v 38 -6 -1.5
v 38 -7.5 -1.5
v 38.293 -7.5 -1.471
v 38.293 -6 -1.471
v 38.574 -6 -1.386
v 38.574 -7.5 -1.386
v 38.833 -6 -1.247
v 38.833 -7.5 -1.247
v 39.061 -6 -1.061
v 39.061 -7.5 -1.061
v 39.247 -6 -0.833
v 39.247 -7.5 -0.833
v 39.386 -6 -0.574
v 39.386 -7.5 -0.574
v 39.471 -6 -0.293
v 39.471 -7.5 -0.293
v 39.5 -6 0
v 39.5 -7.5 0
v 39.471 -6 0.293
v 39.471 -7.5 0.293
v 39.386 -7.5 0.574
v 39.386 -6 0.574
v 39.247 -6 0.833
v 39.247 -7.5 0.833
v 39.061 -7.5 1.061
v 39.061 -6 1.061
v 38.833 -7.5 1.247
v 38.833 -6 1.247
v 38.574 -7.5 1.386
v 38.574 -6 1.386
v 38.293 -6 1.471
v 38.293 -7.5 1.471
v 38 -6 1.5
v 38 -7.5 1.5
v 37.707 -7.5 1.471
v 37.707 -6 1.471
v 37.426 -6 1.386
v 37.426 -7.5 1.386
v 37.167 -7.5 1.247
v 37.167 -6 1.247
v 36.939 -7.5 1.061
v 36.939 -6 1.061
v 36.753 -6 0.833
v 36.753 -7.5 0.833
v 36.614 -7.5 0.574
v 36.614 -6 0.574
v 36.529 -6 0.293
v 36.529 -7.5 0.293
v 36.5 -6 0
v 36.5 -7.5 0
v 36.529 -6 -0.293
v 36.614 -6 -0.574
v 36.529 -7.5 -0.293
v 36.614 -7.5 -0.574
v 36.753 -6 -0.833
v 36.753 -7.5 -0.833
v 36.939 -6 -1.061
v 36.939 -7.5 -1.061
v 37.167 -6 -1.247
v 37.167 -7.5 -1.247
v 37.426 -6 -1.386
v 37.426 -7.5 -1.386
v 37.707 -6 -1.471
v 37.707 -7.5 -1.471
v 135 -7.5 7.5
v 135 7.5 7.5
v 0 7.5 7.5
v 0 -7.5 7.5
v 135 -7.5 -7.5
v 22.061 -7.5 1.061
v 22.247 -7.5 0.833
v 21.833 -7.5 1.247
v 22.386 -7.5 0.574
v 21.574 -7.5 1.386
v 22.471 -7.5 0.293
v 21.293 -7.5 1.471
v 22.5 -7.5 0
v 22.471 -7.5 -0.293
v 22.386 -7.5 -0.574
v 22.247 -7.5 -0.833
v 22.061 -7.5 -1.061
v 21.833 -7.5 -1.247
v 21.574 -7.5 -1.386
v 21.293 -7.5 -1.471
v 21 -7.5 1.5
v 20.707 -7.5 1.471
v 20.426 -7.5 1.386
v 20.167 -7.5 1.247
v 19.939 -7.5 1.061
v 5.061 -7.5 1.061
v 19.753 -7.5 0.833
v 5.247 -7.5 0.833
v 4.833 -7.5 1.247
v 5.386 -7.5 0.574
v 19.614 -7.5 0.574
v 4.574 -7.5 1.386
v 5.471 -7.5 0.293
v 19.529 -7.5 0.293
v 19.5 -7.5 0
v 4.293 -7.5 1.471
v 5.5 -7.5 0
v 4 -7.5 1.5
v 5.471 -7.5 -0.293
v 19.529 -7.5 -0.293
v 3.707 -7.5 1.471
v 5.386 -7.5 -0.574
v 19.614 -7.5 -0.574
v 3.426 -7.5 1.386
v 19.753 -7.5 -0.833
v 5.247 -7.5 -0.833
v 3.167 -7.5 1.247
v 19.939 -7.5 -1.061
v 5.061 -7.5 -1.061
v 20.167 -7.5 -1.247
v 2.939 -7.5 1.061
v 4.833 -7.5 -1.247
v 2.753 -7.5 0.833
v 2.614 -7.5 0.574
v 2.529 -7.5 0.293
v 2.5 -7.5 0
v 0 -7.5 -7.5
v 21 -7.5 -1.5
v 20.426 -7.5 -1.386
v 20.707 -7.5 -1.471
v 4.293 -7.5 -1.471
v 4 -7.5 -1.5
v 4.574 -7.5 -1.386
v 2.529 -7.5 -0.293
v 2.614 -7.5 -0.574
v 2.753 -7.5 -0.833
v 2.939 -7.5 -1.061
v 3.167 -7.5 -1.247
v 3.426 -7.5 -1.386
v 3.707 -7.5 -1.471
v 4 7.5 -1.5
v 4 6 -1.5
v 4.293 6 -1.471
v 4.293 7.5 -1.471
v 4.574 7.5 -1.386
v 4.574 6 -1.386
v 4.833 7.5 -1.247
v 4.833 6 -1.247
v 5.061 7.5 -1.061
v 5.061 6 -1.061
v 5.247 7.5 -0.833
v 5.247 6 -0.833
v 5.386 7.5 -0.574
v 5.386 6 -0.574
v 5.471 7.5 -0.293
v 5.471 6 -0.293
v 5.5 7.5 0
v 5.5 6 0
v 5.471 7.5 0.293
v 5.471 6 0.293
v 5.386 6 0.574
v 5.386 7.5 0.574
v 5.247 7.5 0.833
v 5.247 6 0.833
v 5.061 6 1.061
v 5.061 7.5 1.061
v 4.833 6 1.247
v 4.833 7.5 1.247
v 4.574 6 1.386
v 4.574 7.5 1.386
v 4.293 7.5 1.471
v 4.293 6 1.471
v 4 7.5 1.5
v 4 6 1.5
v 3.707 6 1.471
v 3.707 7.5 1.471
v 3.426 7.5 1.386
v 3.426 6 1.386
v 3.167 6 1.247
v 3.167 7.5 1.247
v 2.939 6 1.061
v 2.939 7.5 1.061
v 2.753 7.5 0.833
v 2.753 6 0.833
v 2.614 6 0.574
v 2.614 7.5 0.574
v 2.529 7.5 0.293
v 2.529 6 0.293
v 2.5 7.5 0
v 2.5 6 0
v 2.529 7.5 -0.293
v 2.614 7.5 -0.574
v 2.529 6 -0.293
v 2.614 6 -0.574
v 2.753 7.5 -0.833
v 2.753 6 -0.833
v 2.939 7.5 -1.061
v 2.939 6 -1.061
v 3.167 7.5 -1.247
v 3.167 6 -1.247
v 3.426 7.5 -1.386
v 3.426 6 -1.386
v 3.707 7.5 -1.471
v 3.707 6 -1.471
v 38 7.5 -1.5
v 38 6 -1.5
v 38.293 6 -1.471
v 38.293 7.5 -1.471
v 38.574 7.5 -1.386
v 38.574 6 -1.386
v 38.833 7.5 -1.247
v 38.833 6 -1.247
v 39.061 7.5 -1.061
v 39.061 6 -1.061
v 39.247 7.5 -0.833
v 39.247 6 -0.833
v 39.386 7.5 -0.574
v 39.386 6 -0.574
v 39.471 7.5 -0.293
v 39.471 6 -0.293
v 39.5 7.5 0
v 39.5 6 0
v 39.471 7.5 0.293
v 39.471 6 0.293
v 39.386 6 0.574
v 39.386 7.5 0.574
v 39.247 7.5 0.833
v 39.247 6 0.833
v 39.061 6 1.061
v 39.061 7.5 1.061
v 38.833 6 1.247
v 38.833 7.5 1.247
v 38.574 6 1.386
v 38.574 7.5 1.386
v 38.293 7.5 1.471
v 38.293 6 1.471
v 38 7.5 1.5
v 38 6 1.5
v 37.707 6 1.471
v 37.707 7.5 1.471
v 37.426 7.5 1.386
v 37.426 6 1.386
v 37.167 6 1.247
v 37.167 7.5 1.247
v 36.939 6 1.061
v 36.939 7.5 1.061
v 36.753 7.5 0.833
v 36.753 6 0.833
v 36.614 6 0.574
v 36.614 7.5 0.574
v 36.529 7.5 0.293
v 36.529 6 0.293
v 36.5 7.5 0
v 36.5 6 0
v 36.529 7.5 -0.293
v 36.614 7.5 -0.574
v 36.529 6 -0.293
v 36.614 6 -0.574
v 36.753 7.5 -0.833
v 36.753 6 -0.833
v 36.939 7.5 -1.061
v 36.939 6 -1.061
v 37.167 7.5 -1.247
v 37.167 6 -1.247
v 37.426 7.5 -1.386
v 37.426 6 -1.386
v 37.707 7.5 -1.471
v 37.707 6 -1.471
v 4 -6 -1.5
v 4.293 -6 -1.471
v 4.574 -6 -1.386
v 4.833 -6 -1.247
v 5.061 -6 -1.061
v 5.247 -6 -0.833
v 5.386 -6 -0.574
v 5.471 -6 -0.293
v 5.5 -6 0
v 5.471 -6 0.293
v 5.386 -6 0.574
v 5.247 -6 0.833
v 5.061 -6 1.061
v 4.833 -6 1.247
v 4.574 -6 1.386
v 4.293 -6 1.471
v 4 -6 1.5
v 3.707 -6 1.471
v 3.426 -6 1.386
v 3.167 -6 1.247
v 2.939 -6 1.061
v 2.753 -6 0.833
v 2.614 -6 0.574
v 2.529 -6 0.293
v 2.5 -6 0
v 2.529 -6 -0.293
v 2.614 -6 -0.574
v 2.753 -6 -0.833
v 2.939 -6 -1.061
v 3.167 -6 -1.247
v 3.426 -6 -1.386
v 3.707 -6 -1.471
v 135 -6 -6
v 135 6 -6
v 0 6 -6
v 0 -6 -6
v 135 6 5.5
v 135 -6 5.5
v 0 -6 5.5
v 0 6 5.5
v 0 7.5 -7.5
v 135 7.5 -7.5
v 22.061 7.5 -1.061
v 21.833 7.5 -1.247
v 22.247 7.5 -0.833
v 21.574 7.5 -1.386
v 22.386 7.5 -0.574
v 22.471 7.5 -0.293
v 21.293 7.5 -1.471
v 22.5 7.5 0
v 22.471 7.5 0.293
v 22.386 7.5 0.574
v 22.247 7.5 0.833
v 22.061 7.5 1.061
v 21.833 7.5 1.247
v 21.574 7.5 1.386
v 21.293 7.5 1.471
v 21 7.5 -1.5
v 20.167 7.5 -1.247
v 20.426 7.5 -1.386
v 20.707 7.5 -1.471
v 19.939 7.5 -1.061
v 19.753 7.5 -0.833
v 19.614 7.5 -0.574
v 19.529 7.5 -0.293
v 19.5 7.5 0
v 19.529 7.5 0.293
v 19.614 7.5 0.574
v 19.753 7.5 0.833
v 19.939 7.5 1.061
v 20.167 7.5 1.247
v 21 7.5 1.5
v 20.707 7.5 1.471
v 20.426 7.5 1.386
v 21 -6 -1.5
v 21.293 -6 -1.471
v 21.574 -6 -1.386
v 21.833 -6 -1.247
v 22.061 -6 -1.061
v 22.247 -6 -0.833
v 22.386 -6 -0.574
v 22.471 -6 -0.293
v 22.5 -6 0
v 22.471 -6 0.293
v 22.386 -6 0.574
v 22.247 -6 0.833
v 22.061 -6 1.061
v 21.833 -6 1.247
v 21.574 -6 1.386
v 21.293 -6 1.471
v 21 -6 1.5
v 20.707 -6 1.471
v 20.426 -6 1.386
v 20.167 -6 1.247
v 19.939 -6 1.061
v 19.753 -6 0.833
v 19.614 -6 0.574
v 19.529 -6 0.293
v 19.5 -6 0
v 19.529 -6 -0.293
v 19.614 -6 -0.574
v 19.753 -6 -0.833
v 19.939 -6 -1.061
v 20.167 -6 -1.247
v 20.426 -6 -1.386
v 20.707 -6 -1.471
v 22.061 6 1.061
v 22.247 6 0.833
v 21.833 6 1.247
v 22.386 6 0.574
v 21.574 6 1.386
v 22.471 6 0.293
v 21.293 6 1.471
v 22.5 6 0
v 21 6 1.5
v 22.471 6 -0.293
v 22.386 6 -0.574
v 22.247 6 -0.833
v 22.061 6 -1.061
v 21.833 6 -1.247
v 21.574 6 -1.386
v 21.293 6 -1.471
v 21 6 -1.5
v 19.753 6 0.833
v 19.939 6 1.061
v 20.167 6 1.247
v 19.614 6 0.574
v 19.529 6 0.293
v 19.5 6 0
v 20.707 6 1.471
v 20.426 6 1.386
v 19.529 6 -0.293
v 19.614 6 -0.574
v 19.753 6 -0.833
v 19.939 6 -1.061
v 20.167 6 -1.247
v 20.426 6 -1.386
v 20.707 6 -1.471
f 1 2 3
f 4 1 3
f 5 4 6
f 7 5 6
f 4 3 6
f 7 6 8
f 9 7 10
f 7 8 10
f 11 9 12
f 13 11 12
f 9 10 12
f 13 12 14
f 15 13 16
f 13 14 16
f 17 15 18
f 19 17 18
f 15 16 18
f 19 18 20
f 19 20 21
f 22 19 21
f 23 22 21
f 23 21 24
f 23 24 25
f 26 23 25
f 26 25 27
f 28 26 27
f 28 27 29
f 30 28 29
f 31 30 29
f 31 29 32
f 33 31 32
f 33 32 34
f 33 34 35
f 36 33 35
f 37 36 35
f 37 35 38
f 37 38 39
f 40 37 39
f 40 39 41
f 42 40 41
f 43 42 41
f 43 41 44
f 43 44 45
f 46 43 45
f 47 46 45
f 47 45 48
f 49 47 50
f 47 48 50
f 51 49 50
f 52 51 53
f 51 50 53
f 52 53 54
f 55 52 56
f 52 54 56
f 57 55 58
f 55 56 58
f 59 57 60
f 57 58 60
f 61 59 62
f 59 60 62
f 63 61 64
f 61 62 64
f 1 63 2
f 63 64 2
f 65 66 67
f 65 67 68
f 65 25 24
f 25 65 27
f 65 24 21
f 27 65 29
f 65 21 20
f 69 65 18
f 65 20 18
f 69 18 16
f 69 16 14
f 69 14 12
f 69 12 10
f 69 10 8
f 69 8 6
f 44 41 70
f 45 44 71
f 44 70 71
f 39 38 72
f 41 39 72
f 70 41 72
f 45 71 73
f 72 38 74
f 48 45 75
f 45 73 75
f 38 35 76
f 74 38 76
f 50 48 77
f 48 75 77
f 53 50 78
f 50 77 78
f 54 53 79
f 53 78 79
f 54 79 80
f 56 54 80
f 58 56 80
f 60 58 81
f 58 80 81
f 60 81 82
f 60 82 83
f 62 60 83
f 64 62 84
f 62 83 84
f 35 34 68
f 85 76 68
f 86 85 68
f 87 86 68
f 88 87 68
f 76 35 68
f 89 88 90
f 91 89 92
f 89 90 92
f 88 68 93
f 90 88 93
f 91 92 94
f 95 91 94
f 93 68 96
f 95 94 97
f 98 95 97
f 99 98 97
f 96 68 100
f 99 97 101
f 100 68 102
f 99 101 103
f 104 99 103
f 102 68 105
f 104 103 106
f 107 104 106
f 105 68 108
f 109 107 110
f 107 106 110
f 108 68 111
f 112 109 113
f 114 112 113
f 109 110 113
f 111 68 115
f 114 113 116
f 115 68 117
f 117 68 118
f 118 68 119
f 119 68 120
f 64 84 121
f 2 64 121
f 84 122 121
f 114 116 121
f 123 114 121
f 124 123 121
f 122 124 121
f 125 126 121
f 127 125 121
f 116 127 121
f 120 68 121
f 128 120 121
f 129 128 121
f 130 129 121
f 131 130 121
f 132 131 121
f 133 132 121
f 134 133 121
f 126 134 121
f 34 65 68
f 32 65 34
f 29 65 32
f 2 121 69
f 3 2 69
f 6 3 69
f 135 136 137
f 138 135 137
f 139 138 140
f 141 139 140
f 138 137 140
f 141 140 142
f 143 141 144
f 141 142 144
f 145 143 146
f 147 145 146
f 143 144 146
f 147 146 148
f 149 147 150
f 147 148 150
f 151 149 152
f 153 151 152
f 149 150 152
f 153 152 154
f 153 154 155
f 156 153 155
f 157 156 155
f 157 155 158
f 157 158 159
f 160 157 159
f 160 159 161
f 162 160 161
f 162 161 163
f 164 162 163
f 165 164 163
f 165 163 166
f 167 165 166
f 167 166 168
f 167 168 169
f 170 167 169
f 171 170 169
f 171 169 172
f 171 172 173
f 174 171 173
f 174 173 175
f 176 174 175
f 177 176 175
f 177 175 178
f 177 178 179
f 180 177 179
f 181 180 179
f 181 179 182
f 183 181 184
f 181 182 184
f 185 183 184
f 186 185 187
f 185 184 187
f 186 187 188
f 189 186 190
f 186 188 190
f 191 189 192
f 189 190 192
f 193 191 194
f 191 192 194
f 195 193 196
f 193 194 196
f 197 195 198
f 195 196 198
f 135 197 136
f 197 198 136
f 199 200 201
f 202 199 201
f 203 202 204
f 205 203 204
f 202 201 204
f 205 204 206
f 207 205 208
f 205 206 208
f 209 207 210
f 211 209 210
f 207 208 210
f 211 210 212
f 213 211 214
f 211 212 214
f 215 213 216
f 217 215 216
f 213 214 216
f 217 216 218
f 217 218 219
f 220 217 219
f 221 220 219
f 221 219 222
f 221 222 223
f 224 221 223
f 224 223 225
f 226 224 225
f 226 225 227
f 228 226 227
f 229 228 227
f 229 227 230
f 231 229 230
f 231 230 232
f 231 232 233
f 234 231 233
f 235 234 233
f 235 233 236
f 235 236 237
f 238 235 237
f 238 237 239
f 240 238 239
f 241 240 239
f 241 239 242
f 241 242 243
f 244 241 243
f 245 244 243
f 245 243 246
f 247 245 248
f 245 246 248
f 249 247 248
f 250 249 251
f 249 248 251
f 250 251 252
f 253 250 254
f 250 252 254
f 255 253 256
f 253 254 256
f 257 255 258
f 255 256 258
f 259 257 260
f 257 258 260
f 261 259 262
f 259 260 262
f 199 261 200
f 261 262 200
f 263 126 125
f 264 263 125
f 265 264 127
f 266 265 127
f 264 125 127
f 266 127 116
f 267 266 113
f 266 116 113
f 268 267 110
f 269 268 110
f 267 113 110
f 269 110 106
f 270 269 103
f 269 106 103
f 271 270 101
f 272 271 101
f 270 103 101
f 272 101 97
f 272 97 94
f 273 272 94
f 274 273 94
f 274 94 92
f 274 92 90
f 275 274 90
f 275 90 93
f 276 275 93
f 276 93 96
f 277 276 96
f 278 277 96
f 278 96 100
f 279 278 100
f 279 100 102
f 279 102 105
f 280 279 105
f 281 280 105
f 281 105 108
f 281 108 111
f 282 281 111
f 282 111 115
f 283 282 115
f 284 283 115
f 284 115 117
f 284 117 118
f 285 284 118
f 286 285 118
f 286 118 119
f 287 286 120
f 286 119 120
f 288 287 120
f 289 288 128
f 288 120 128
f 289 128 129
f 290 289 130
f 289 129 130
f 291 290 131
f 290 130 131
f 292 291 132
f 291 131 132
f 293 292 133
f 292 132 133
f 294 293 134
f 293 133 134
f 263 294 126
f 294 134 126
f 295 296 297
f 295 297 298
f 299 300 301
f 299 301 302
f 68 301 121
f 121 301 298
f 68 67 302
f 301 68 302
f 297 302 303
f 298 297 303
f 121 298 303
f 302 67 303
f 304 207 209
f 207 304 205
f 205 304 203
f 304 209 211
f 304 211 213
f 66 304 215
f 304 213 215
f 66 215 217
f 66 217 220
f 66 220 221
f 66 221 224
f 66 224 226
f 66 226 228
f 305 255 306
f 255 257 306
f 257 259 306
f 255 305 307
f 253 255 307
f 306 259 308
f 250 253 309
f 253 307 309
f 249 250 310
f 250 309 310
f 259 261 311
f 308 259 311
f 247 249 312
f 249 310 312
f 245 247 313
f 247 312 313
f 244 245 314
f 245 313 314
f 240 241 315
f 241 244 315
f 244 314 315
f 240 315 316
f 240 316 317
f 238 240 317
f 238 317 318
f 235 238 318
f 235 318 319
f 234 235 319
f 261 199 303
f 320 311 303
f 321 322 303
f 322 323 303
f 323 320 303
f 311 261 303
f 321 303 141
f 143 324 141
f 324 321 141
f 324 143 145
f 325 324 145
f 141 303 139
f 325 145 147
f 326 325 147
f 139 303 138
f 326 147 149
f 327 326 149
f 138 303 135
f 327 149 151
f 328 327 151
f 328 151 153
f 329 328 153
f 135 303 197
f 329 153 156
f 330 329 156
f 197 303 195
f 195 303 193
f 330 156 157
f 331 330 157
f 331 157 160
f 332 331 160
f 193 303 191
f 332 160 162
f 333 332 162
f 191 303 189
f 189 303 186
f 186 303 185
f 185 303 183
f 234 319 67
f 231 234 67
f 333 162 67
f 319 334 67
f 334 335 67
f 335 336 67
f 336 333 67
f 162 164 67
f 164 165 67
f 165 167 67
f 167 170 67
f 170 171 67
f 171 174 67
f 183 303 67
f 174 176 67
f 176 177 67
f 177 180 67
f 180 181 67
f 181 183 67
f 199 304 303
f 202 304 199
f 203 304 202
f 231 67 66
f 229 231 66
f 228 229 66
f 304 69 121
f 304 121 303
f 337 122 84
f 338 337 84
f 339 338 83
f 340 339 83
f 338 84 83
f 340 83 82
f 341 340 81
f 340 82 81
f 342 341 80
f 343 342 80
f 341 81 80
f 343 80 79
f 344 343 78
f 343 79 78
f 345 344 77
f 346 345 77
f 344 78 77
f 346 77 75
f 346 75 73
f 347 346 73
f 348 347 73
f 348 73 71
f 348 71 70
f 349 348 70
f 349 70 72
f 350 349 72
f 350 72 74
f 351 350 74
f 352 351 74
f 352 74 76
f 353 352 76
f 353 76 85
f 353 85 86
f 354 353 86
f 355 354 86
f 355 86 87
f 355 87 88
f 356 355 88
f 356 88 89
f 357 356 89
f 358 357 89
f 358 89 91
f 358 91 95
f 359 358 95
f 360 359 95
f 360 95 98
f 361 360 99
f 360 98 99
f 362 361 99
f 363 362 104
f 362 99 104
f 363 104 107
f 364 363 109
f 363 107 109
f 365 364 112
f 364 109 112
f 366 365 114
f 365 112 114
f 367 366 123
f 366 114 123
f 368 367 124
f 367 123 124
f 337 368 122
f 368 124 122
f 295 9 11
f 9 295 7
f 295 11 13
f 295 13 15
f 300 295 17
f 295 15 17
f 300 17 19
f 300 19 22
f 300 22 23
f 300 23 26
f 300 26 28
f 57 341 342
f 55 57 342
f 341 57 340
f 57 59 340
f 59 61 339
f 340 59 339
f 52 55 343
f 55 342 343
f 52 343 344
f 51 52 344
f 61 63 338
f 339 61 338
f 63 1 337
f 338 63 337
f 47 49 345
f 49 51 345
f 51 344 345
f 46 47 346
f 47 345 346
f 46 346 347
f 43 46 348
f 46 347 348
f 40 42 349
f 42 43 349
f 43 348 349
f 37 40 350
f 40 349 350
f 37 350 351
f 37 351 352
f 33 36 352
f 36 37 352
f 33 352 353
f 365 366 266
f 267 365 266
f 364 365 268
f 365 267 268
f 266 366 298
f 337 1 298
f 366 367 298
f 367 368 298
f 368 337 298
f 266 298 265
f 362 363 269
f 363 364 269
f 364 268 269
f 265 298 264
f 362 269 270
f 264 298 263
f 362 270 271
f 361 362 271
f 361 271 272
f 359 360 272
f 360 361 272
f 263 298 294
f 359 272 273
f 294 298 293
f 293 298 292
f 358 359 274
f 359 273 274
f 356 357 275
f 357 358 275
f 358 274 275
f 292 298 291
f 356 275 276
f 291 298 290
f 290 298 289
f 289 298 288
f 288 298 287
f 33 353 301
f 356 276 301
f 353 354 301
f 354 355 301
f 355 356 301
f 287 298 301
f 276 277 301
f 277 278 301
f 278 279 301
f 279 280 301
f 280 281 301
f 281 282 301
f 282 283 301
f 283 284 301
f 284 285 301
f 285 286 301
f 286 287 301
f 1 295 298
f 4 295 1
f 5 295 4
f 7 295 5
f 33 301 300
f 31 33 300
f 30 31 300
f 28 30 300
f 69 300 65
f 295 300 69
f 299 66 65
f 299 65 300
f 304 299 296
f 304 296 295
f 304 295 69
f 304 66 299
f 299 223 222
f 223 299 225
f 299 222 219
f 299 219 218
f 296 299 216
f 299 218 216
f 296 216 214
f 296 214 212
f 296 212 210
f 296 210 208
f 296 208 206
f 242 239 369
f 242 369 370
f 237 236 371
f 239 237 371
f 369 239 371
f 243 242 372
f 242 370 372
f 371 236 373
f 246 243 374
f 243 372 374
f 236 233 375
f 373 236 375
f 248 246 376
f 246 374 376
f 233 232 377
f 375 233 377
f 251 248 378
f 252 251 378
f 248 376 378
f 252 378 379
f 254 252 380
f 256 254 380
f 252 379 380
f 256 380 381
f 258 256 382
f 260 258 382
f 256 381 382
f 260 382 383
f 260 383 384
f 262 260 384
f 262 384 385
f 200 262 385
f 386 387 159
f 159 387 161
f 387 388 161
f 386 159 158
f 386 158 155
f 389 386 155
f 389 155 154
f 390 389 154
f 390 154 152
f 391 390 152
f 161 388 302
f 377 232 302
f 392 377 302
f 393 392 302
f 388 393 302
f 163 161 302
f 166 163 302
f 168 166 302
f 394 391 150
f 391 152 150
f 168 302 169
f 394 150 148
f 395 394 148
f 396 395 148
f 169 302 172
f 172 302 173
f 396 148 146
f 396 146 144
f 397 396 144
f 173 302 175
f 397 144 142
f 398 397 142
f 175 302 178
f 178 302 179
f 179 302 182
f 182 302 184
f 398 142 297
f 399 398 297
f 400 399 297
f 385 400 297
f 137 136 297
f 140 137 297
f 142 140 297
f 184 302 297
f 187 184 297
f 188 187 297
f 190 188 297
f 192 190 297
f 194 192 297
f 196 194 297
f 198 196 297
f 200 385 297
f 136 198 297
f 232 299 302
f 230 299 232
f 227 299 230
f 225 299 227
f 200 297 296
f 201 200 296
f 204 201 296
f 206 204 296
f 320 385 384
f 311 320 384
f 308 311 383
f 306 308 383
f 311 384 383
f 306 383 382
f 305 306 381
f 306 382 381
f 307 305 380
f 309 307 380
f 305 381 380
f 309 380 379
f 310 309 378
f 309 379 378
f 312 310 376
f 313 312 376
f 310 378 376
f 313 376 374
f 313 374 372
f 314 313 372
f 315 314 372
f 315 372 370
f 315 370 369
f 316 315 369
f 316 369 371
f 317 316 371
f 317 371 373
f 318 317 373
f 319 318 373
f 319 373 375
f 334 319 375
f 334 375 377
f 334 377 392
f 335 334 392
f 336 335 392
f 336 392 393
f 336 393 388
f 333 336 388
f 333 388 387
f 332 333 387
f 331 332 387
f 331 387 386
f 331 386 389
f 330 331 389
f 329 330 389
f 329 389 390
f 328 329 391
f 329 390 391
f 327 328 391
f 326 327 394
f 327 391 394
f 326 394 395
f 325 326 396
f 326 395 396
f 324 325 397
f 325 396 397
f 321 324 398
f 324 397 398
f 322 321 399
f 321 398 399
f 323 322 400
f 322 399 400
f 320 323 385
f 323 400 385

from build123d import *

# Parameters (mm, degrees)
MEMBER_15_15_1_5_1_DEPTH = 135
SKETCH_4_R               = 1.5
CUT_EXTRUDE_1_DEPTH      = 137.037678604


with BuildPart() as part:
    # Sketch1 → Member 15 _15_ 1.5_1 (new body)
    with BuildSketch(Plane(origin=(0, 0, 0), x_dir=(0, 0, -1), z_dir=(1, 0, 0))):
        Polygon((-6, -7.5), (6, -7.5), (7.5, -7.5), (7.5, -6), (7.5, 6), (7.5, 7.5), (6, 7.5), (-6, 7.5), (-7.5, 7.5), (-7.5, 6), (-7.5, -6), (-7.5, -7.5), align=None)
        Polygon((-4, -6), (4, -6), (6, -6), (6, -3.5), (6, 3.5), (6, 6), (3.5, 6), (-3.5, 6), (-5.5, 6), (-5.5, 3.5), (-5.5, -3.5), (-5.5, -6), align=None, mode=Mode.SUBTRACT)
    extrude(amount=MEMBER_15_15_1_5_1_DEPTH)

    # 草图4 → 切除-拉伸1 (cut, through all)
    with BuildSketch(Plane.XZ.offset(7.5)):
        with Locations(Location((38, 0, 0), (0, 0, 270))):
            Circle(SKETCH_4_R)
        with Locations(Location((4, 0, 0), (0, 0, 270))):
            Circle(SKETCH_4_R)
        with Locations(Location((21, 0, 0), (0, 0, 270))):
            Circle(SKETCH_4_R)
    extrude(amount=-CUT_EXTRUDE_1_DEPTH, mode=Mode.SUBTRACT)


solid = part.part
